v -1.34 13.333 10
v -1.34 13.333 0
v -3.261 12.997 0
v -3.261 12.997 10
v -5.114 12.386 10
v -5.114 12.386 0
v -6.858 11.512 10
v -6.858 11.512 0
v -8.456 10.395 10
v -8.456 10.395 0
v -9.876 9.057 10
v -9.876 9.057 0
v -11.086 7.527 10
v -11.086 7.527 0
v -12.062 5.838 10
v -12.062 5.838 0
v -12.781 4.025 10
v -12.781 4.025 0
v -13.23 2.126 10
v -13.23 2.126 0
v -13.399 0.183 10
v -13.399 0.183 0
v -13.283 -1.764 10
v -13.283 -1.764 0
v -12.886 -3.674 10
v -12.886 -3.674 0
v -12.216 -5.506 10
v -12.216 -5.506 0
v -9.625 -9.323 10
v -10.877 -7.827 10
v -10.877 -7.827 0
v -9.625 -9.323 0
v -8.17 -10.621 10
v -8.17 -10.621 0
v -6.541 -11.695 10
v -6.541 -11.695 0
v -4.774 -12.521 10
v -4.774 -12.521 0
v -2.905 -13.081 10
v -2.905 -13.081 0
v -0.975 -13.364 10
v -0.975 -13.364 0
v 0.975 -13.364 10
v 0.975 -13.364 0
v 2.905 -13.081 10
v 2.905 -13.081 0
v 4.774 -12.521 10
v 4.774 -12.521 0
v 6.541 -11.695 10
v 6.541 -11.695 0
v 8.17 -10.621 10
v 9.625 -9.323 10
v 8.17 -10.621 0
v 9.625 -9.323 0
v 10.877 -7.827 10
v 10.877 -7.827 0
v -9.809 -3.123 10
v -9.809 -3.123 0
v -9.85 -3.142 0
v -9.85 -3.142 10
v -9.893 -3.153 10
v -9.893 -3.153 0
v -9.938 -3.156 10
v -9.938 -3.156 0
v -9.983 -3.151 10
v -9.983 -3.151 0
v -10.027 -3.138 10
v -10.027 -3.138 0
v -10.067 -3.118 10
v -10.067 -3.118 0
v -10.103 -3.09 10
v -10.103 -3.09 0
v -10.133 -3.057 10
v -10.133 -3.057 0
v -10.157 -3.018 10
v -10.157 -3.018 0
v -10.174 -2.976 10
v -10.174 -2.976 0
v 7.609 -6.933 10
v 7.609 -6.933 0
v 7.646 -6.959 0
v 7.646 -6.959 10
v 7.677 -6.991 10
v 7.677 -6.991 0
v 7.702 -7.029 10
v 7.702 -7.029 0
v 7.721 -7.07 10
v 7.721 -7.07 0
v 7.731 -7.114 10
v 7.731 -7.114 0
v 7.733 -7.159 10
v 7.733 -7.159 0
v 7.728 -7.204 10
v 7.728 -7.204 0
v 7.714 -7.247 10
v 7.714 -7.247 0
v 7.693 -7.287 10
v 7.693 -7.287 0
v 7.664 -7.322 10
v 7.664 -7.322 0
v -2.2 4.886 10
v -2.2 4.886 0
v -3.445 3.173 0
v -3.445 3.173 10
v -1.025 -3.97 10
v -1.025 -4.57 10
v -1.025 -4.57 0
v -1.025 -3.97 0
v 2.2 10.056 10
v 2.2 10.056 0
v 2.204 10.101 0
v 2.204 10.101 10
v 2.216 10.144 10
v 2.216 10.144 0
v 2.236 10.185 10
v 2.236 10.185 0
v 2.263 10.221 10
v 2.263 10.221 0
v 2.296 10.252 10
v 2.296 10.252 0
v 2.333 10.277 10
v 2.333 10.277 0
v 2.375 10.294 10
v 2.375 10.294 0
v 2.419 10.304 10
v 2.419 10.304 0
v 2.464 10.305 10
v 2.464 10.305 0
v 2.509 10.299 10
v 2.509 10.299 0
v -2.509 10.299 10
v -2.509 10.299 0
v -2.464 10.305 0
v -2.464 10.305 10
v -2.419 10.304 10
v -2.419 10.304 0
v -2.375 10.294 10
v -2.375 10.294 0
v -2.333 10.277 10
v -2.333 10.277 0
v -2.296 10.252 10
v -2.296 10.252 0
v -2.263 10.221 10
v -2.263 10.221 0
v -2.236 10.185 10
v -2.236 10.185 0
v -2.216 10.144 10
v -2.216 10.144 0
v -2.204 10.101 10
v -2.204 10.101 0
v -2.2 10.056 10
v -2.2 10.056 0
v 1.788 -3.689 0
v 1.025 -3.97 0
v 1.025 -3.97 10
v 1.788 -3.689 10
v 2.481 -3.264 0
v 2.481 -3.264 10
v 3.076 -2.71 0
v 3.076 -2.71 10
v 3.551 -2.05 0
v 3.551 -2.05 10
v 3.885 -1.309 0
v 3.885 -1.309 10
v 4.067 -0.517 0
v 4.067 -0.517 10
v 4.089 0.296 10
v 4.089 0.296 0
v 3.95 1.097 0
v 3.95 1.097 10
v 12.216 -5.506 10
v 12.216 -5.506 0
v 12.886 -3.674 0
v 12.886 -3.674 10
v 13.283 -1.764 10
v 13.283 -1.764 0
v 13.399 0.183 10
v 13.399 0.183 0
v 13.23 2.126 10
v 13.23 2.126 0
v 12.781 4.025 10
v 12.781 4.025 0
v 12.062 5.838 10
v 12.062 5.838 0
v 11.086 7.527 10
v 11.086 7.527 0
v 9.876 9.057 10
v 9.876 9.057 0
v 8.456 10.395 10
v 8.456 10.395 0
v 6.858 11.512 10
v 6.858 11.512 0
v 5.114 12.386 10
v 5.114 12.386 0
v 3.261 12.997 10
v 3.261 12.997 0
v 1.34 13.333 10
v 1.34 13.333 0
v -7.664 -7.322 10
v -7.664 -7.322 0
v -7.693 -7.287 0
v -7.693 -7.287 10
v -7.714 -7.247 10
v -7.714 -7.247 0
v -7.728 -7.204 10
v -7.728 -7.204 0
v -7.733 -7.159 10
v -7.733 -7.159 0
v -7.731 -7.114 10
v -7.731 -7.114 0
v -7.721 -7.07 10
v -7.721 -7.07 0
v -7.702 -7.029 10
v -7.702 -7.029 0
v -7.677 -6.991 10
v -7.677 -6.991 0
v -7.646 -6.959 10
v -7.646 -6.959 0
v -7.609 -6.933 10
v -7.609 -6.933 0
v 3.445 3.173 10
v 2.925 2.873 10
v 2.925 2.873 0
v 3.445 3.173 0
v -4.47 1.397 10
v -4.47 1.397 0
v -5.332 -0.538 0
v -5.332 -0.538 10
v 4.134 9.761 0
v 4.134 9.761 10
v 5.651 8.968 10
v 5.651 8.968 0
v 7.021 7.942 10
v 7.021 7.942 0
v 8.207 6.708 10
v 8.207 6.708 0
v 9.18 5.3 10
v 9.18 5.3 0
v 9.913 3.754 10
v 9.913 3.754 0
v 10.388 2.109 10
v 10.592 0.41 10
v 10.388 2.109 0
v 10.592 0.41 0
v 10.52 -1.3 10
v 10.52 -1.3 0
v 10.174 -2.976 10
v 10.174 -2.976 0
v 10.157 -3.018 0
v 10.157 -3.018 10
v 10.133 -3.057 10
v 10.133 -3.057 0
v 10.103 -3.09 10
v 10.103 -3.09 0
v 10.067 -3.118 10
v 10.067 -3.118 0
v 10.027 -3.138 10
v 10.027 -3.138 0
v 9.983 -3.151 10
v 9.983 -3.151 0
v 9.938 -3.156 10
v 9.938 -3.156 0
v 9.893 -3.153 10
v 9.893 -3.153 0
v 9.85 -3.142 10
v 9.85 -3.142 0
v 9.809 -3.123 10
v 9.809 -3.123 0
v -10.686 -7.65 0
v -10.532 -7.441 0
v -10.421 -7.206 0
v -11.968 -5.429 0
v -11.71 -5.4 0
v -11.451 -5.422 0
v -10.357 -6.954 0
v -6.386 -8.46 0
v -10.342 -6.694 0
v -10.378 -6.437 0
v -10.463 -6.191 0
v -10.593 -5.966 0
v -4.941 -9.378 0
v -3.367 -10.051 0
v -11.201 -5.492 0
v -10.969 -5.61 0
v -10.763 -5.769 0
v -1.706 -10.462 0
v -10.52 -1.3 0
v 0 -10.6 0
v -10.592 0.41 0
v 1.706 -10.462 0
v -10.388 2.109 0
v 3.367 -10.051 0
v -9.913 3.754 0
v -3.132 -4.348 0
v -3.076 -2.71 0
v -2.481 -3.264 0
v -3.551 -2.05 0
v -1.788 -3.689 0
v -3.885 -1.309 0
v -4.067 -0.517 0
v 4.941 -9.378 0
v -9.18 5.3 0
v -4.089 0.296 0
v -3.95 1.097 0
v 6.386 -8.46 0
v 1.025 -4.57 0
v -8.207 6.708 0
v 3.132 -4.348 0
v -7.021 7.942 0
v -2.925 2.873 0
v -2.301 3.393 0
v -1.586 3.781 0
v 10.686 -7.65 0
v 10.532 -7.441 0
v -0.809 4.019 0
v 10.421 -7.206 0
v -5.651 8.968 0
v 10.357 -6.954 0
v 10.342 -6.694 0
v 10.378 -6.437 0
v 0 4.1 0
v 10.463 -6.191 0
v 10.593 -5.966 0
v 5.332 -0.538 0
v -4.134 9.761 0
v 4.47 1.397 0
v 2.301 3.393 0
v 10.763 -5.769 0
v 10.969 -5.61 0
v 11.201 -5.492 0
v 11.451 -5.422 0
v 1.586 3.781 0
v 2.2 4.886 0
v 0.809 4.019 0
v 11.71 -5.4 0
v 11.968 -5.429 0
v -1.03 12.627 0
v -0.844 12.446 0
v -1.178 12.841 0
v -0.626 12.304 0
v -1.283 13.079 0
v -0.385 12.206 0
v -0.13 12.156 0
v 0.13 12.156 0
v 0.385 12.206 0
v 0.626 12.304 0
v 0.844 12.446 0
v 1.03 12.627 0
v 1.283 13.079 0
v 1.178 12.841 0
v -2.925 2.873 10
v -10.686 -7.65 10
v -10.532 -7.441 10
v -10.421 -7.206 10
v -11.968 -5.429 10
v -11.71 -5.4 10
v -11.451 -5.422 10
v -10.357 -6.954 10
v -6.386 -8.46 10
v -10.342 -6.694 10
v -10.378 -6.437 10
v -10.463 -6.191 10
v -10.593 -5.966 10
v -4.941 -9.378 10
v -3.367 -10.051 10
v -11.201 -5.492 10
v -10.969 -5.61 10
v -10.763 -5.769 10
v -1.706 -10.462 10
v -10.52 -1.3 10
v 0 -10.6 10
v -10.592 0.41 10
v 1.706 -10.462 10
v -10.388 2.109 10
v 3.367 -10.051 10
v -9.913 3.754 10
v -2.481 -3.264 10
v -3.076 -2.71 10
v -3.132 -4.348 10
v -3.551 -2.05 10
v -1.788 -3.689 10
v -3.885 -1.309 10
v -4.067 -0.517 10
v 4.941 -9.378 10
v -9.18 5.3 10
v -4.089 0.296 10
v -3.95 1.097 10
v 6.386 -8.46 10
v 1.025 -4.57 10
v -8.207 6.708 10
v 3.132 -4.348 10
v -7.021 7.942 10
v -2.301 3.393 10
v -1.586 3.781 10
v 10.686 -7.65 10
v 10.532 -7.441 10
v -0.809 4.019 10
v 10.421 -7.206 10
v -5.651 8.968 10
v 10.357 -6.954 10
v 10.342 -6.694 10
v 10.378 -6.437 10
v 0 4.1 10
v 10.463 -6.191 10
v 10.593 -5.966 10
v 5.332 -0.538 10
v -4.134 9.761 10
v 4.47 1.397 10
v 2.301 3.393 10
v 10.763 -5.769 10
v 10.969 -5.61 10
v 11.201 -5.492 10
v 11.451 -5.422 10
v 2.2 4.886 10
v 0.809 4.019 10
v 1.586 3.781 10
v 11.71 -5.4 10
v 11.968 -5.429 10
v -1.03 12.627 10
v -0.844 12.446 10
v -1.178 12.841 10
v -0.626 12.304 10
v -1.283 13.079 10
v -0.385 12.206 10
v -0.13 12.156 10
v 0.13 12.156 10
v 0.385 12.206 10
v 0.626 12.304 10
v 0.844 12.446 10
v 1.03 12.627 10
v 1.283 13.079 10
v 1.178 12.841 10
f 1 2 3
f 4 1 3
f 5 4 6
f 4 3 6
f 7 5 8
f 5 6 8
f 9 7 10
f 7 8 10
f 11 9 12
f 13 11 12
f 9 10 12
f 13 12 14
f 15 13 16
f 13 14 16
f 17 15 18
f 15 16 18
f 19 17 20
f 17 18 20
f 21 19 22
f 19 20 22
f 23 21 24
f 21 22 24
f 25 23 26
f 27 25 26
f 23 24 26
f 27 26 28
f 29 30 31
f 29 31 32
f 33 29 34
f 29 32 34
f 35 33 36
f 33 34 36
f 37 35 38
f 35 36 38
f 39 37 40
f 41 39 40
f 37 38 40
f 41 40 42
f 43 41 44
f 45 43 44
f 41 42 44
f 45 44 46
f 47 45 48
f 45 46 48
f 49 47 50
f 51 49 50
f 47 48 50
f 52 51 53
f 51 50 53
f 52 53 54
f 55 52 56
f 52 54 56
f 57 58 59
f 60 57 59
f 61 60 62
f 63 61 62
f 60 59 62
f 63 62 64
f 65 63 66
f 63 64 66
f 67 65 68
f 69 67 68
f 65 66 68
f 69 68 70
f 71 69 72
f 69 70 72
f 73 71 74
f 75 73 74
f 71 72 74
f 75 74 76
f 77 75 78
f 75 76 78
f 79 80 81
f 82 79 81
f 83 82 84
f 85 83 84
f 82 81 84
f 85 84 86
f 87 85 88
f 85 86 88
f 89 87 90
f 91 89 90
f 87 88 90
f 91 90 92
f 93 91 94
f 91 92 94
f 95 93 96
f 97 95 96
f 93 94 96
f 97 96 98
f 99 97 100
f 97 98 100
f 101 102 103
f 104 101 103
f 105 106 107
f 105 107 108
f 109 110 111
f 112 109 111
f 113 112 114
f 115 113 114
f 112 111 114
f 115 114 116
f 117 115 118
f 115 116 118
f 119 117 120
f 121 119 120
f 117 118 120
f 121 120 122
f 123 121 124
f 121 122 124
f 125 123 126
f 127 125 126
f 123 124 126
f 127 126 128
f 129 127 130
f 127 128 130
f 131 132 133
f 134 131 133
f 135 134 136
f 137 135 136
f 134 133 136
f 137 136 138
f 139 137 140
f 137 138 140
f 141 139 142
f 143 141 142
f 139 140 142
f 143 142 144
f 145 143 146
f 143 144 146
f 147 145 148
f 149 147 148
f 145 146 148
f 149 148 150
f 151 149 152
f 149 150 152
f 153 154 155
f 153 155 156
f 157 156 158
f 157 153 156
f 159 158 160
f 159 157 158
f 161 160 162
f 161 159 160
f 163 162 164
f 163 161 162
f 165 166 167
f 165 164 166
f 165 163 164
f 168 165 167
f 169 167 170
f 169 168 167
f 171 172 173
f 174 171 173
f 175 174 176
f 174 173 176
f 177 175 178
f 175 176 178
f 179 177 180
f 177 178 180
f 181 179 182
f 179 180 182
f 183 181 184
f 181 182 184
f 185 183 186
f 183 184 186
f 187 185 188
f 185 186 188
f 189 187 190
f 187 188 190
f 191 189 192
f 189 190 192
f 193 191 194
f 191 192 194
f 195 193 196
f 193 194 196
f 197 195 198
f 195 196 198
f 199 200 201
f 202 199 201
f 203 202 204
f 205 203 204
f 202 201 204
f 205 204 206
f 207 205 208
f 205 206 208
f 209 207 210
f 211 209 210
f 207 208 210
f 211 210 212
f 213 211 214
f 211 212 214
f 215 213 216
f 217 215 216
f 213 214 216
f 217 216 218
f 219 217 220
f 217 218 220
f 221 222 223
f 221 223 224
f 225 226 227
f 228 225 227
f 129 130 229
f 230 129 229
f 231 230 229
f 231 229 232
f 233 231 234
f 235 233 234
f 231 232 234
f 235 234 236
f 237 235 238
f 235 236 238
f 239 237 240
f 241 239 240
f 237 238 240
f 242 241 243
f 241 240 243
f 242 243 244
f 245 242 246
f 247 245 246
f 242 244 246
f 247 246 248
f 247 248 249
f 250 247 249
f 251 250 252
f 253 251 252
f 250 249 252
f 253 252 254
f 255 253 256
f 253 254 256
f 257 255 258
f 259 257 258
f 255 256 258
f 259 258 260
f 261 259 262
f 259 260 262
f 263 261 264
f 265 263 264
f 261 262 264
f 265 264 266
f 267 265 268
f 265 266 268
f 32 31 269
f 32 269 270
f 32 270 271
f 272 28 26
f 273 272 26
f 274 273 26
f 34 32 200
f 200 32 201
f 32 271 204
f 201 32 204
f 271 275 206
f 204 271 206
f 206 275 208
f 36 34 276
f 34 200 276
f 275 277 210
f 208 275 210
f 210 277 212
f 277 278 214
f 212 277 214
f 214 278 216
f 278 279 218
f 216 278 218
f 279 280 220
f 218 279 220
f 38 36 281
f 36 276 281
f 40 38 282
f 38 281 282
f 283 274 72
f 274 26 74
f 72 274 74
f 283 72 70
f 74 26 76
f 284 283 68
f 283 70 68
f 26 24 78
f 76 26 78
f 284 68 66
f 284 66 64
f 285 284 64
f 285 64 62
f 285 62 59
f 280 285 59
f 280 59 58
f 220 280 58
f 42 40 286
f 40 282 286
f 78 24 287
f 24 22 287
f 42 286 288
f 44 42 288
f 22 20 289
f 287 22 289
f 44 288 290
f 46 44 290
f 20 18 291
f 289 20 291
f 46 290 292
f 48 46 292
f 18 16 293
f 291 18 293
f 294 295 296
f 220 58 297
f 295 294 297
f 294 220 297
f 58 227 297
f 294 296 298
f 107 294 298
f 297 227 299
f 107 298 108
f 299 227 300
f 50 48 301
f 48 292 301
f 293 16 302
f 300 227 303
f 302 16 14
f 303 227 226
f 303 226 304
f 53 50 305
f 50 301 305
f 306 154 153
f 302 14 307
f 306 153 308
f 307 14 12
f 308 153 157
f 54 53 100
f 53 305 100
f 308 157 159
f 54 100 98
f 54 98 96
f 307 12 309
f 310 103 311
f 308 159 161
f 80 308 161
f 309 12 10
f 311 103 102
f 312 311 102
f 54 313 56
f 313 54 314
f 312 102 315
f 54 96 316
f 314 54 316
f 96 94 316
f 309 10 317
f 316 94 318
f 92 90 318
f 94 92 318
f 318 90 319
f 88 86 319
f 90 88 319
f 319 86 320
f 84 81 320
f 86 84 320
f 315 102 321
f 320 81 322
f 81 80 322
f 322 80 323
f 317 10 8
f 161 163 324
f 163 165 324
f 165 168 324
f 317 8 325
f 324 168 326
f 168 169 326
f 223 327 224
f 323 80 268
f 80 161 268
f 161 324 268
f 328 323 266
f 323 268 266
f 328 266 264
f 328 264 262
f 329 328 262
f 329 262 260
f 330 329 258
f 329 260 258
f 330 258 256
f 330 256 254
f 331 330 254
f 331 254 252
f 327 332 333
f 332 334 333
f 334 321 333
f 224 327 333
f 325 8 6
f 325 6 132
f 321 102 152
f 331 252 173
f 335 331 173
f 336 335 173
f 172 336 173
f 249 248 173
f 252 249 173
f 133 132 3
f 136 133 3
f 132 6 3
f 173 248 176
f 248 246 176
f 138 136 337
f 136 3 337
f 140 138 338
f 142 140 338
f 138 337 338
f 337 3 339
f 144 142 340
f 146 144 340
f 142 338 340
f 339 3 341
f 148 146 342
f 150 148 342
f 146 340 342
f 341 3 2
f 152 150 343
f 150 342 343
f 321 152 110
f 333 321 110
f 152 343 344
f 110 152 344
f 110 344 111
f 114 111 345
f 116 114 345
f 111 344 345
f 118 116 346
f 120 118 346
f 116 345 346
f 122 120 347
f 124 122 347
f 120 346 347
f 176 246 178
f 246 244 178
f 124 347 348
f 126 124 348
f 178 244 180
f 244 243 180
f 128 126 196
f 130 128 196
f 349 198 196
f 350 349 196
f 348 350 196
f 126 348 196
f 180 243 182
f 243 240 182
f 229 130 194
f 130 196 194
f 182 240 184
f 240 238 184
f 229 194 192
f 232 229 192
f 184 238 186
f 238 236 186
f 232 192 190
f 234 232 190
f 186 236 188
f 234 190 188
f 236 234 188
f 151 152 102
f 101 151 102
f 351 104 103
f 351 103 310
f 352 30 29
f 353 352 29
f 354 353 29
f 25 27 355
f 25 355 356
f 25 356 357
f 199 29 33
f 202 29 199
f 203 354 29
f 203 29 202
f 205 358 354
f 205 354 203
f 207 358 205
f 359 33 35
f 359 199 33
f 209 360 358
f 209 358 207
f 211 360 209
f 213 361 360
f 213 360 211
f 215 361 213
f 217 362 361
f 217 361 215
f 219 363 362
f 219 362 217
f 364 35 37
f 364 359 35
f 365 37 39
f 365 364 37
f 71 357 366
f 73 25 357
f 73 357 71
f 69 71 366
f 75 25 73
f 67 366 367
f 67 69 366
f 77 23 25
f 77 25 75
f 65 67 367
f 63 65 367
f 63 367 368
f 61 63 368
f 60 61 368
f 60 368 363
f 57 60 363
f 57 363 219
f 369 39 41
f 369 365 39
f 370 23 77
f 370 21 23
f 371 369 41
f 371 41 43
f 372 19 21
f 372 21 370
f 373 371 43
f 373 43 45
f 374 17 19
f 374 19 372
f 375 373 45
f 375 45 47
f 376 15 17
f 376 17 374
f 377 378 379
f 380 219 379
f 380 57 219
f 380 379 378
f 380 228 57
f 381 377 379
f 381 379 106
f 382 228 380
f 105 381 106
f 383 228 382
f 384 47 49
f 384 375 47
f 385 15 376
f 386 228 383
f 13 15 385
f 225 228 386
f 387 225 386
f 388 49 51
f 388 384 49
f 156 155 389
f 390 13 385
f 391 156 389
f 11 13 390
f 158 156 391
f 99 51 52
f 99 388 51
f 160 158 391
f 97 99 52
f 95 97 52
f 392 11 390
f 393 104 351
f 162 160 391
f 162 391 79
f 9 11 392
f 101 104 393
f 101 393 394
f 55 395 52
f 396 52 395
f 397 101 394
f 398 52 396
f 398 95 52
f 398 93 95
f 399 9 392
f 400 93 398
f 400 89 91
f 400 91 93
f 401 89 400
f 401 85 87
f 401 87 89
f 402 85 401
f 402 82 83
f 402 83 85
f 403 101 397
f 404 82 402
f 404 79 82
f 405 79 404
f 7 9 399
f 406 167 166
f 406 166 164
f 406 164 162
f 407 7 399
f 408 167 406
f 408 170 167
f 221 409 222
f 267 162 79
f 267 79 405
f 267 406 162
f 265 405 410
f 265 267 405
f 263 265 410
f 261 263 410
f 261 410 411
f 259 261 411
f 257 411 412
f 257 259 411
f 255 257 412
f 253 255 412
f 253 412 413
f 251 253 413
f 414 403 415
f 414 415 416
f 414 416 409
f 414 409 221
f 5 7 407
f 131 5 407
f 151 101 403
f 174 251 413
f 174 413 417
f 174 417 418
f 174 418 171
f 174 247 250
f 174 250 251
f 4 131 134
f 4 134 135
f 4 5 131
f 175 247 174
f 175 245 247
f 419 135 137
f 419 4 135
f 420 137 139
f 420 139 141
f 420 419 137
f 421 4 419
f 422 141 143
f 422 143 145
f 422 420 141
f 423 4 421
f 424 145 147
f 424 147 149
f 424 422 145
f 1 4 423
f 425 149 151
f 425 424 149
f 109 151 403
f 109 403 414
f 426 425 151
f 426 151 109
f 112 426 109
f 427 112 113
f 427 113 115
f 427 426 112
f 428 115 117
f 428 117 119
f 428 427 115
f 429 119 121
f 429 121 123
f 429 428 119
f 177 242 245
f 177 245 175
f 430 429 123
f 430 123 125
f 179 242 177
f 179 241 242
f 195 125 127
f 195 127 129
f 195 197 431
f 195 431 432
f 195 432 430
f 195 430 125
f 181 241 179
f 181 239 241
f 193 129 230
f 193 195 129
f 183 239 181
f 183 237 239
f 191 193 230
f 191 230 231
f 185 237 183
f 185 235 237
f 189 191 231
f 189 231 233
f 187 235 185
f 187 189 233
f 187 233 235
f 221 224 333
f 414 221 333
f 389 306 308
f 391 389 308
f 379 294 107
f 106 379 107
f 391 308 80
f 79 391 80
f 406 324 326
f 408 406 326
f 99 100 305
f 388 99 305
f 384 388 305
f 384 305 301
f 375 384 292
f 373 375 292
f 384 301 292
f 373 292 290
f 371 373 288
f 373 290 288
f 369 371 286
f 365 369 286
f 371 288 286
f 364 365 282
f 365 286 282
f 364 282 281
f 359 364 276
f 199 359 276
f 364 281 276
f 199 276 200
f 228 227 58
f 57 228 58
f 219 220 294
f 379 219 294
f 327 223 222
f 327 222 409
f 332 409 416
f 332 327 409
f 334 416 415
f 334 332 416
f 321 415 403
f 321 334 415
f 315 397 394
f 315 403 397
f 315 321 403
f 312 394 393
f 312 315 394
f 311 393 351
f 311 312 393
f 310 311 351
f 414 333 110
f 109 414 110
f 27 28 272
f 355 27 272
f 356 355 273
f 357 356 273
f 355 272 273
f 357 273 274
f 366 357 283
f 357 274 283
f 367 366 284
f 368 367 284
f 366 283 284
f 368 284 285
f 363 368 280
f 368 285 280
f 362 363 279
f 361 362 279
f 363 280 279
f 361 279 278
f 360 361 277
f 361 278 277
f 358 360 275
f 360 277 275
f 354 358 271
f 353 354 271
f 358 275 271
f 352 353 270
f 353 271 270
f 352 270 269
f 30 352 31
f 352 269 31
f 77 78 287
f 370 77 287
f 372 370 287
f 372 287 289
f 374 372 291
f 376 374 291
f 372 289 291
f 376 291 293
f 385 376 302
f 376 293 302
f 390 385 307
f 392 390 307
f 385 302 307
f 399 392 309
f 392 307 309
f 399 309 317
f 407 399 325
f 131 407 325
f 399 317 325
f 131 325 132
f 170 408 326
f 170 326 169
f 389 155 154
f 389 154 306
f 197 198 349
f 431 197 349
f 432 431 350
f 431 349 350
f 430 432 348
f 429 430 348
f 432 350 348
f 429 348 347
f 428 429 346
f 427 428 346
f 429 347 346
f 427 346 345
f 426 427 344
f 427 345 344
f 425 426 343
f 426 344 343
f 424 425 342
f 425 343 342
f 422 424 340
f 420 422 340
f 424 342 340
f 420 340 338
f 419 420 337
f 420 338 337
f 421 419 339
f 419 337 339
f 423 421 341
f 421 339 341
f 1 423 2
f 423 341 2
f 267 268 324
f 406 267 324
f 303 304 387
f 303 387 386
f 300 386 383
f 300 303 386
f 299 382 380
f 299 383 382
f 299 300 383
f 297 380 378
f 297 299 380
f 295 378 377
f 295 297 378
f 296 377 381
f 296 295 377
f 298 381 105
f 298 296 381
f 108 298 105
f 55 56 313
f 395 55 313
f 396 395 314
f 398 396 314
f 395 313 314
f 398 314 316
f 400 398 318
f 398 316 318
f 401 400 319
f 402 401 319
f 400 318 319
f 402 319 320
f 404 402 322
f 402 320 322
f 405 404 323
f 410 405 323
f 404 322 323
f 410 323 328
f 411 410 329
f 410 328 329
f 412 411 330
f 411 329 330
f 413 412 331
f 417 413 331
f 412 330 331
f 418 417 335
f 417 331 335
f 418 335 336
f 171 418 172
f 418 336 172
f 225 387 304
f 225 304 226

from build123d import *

# Parameters (mm, degrees)
SKETCH_1_R               = 4.1
EXTRUDE_1_DEPTH          = 10
CUT_EXTRUDE_1_DEPTH      = 10
PATTERN_CIRCULAR_1_COUNT = 3


with BuildPart() as part:
    # 草图1 → 凸台-拉伸1 (new body)
    with BuildSketch(Plane.XY):
        with BuildLine():
            ThreePointArc((-1.339614753, 13.33287037), (-11.604740411, 6.7), (-12.216411823, -5.506294778))
            ThreePointArc((-12.216411823, -5.506294778), (-10.522208656, -6.075), (-10.87679707, -7.826575593))
            ThreePointArc((-10.87679707, -7.826575593), (0, -13.4), (10.87679707, -7.826575593))
            ThreePointArc((10.87679707, -7.826575593), (10.522208656, -6.075), (12.216411823, -5.506294778))
            ThreePointArc((12.216411823, -5.506294778), (11.604740411, 6.7), (1.339614753, 13.33287037))
            ThreePointArc((1.339614753, 13.33287037), (0, 12.15), (-1.339614753, 13.33287037))
        make_face()
        Circle(SKETCH_1_R, mode=Mode.SUBTRACT)
    extrude(amount=EXTRUDE_1_DEPTH)

    # 草图2 → 切除-拉伸1 (cut)
    with BuildSketch(Plane.XY):
        with BuildLine():
            Line((-7.608616423, -6.933177924), (-3.131635256, -4.348391642))
            Line((-3.131635256, -4.348391642), (-1.025, -4.56980793))
            Line((-1.025, -4.56980793), (-1.025, -3.96980793))
            ThreePointArc((-1.025, -3.96980793), (0, -4.1), (1.025, -3.96980793))
            Line((1.025, -3.96980793), (1.025, -4.56980793))
            Line((1.025, -4.56980793), (3.131635256, -4.348391642))
            Line((3.131635256, -4.348391642), (7.608616423, -6.933177924))
            ThreePointArc((7.608616423, -6.933177924), (7.731089256, -7.114227304), (7.664380105, -7.322381963))
            ThreePointArc((7.664380105, -7.322381963), (0, -10.6), (-7.664380105, -7.322381963))
            ThreePointArc((-7.664380105, -7.322381963), (-7.731089256, -7.114227304), (-7.608616423, -6.933177924))
        make_face()
    cut_extrude_1 = extrude(amount=CUT_EXTRUDE_1_DEPTH, mode=Mode.SUBTRACT)

    # 阵列(圆周)1: 切除-拉伸1 ×3 about axis
    pattern_circular_1_axis = Axis((0, 0, 0), (0, 0, 1))
    for i in range(1, PATTERN_CIRCULAR_1_COUNT):
        add(cut_extrude_1.rotate(pattern_circular_1_axis, i * 360 / PATTERN_CIRCULAR_1_COUNT), mode=Mode.SUBTRACT)


solid = part.part
